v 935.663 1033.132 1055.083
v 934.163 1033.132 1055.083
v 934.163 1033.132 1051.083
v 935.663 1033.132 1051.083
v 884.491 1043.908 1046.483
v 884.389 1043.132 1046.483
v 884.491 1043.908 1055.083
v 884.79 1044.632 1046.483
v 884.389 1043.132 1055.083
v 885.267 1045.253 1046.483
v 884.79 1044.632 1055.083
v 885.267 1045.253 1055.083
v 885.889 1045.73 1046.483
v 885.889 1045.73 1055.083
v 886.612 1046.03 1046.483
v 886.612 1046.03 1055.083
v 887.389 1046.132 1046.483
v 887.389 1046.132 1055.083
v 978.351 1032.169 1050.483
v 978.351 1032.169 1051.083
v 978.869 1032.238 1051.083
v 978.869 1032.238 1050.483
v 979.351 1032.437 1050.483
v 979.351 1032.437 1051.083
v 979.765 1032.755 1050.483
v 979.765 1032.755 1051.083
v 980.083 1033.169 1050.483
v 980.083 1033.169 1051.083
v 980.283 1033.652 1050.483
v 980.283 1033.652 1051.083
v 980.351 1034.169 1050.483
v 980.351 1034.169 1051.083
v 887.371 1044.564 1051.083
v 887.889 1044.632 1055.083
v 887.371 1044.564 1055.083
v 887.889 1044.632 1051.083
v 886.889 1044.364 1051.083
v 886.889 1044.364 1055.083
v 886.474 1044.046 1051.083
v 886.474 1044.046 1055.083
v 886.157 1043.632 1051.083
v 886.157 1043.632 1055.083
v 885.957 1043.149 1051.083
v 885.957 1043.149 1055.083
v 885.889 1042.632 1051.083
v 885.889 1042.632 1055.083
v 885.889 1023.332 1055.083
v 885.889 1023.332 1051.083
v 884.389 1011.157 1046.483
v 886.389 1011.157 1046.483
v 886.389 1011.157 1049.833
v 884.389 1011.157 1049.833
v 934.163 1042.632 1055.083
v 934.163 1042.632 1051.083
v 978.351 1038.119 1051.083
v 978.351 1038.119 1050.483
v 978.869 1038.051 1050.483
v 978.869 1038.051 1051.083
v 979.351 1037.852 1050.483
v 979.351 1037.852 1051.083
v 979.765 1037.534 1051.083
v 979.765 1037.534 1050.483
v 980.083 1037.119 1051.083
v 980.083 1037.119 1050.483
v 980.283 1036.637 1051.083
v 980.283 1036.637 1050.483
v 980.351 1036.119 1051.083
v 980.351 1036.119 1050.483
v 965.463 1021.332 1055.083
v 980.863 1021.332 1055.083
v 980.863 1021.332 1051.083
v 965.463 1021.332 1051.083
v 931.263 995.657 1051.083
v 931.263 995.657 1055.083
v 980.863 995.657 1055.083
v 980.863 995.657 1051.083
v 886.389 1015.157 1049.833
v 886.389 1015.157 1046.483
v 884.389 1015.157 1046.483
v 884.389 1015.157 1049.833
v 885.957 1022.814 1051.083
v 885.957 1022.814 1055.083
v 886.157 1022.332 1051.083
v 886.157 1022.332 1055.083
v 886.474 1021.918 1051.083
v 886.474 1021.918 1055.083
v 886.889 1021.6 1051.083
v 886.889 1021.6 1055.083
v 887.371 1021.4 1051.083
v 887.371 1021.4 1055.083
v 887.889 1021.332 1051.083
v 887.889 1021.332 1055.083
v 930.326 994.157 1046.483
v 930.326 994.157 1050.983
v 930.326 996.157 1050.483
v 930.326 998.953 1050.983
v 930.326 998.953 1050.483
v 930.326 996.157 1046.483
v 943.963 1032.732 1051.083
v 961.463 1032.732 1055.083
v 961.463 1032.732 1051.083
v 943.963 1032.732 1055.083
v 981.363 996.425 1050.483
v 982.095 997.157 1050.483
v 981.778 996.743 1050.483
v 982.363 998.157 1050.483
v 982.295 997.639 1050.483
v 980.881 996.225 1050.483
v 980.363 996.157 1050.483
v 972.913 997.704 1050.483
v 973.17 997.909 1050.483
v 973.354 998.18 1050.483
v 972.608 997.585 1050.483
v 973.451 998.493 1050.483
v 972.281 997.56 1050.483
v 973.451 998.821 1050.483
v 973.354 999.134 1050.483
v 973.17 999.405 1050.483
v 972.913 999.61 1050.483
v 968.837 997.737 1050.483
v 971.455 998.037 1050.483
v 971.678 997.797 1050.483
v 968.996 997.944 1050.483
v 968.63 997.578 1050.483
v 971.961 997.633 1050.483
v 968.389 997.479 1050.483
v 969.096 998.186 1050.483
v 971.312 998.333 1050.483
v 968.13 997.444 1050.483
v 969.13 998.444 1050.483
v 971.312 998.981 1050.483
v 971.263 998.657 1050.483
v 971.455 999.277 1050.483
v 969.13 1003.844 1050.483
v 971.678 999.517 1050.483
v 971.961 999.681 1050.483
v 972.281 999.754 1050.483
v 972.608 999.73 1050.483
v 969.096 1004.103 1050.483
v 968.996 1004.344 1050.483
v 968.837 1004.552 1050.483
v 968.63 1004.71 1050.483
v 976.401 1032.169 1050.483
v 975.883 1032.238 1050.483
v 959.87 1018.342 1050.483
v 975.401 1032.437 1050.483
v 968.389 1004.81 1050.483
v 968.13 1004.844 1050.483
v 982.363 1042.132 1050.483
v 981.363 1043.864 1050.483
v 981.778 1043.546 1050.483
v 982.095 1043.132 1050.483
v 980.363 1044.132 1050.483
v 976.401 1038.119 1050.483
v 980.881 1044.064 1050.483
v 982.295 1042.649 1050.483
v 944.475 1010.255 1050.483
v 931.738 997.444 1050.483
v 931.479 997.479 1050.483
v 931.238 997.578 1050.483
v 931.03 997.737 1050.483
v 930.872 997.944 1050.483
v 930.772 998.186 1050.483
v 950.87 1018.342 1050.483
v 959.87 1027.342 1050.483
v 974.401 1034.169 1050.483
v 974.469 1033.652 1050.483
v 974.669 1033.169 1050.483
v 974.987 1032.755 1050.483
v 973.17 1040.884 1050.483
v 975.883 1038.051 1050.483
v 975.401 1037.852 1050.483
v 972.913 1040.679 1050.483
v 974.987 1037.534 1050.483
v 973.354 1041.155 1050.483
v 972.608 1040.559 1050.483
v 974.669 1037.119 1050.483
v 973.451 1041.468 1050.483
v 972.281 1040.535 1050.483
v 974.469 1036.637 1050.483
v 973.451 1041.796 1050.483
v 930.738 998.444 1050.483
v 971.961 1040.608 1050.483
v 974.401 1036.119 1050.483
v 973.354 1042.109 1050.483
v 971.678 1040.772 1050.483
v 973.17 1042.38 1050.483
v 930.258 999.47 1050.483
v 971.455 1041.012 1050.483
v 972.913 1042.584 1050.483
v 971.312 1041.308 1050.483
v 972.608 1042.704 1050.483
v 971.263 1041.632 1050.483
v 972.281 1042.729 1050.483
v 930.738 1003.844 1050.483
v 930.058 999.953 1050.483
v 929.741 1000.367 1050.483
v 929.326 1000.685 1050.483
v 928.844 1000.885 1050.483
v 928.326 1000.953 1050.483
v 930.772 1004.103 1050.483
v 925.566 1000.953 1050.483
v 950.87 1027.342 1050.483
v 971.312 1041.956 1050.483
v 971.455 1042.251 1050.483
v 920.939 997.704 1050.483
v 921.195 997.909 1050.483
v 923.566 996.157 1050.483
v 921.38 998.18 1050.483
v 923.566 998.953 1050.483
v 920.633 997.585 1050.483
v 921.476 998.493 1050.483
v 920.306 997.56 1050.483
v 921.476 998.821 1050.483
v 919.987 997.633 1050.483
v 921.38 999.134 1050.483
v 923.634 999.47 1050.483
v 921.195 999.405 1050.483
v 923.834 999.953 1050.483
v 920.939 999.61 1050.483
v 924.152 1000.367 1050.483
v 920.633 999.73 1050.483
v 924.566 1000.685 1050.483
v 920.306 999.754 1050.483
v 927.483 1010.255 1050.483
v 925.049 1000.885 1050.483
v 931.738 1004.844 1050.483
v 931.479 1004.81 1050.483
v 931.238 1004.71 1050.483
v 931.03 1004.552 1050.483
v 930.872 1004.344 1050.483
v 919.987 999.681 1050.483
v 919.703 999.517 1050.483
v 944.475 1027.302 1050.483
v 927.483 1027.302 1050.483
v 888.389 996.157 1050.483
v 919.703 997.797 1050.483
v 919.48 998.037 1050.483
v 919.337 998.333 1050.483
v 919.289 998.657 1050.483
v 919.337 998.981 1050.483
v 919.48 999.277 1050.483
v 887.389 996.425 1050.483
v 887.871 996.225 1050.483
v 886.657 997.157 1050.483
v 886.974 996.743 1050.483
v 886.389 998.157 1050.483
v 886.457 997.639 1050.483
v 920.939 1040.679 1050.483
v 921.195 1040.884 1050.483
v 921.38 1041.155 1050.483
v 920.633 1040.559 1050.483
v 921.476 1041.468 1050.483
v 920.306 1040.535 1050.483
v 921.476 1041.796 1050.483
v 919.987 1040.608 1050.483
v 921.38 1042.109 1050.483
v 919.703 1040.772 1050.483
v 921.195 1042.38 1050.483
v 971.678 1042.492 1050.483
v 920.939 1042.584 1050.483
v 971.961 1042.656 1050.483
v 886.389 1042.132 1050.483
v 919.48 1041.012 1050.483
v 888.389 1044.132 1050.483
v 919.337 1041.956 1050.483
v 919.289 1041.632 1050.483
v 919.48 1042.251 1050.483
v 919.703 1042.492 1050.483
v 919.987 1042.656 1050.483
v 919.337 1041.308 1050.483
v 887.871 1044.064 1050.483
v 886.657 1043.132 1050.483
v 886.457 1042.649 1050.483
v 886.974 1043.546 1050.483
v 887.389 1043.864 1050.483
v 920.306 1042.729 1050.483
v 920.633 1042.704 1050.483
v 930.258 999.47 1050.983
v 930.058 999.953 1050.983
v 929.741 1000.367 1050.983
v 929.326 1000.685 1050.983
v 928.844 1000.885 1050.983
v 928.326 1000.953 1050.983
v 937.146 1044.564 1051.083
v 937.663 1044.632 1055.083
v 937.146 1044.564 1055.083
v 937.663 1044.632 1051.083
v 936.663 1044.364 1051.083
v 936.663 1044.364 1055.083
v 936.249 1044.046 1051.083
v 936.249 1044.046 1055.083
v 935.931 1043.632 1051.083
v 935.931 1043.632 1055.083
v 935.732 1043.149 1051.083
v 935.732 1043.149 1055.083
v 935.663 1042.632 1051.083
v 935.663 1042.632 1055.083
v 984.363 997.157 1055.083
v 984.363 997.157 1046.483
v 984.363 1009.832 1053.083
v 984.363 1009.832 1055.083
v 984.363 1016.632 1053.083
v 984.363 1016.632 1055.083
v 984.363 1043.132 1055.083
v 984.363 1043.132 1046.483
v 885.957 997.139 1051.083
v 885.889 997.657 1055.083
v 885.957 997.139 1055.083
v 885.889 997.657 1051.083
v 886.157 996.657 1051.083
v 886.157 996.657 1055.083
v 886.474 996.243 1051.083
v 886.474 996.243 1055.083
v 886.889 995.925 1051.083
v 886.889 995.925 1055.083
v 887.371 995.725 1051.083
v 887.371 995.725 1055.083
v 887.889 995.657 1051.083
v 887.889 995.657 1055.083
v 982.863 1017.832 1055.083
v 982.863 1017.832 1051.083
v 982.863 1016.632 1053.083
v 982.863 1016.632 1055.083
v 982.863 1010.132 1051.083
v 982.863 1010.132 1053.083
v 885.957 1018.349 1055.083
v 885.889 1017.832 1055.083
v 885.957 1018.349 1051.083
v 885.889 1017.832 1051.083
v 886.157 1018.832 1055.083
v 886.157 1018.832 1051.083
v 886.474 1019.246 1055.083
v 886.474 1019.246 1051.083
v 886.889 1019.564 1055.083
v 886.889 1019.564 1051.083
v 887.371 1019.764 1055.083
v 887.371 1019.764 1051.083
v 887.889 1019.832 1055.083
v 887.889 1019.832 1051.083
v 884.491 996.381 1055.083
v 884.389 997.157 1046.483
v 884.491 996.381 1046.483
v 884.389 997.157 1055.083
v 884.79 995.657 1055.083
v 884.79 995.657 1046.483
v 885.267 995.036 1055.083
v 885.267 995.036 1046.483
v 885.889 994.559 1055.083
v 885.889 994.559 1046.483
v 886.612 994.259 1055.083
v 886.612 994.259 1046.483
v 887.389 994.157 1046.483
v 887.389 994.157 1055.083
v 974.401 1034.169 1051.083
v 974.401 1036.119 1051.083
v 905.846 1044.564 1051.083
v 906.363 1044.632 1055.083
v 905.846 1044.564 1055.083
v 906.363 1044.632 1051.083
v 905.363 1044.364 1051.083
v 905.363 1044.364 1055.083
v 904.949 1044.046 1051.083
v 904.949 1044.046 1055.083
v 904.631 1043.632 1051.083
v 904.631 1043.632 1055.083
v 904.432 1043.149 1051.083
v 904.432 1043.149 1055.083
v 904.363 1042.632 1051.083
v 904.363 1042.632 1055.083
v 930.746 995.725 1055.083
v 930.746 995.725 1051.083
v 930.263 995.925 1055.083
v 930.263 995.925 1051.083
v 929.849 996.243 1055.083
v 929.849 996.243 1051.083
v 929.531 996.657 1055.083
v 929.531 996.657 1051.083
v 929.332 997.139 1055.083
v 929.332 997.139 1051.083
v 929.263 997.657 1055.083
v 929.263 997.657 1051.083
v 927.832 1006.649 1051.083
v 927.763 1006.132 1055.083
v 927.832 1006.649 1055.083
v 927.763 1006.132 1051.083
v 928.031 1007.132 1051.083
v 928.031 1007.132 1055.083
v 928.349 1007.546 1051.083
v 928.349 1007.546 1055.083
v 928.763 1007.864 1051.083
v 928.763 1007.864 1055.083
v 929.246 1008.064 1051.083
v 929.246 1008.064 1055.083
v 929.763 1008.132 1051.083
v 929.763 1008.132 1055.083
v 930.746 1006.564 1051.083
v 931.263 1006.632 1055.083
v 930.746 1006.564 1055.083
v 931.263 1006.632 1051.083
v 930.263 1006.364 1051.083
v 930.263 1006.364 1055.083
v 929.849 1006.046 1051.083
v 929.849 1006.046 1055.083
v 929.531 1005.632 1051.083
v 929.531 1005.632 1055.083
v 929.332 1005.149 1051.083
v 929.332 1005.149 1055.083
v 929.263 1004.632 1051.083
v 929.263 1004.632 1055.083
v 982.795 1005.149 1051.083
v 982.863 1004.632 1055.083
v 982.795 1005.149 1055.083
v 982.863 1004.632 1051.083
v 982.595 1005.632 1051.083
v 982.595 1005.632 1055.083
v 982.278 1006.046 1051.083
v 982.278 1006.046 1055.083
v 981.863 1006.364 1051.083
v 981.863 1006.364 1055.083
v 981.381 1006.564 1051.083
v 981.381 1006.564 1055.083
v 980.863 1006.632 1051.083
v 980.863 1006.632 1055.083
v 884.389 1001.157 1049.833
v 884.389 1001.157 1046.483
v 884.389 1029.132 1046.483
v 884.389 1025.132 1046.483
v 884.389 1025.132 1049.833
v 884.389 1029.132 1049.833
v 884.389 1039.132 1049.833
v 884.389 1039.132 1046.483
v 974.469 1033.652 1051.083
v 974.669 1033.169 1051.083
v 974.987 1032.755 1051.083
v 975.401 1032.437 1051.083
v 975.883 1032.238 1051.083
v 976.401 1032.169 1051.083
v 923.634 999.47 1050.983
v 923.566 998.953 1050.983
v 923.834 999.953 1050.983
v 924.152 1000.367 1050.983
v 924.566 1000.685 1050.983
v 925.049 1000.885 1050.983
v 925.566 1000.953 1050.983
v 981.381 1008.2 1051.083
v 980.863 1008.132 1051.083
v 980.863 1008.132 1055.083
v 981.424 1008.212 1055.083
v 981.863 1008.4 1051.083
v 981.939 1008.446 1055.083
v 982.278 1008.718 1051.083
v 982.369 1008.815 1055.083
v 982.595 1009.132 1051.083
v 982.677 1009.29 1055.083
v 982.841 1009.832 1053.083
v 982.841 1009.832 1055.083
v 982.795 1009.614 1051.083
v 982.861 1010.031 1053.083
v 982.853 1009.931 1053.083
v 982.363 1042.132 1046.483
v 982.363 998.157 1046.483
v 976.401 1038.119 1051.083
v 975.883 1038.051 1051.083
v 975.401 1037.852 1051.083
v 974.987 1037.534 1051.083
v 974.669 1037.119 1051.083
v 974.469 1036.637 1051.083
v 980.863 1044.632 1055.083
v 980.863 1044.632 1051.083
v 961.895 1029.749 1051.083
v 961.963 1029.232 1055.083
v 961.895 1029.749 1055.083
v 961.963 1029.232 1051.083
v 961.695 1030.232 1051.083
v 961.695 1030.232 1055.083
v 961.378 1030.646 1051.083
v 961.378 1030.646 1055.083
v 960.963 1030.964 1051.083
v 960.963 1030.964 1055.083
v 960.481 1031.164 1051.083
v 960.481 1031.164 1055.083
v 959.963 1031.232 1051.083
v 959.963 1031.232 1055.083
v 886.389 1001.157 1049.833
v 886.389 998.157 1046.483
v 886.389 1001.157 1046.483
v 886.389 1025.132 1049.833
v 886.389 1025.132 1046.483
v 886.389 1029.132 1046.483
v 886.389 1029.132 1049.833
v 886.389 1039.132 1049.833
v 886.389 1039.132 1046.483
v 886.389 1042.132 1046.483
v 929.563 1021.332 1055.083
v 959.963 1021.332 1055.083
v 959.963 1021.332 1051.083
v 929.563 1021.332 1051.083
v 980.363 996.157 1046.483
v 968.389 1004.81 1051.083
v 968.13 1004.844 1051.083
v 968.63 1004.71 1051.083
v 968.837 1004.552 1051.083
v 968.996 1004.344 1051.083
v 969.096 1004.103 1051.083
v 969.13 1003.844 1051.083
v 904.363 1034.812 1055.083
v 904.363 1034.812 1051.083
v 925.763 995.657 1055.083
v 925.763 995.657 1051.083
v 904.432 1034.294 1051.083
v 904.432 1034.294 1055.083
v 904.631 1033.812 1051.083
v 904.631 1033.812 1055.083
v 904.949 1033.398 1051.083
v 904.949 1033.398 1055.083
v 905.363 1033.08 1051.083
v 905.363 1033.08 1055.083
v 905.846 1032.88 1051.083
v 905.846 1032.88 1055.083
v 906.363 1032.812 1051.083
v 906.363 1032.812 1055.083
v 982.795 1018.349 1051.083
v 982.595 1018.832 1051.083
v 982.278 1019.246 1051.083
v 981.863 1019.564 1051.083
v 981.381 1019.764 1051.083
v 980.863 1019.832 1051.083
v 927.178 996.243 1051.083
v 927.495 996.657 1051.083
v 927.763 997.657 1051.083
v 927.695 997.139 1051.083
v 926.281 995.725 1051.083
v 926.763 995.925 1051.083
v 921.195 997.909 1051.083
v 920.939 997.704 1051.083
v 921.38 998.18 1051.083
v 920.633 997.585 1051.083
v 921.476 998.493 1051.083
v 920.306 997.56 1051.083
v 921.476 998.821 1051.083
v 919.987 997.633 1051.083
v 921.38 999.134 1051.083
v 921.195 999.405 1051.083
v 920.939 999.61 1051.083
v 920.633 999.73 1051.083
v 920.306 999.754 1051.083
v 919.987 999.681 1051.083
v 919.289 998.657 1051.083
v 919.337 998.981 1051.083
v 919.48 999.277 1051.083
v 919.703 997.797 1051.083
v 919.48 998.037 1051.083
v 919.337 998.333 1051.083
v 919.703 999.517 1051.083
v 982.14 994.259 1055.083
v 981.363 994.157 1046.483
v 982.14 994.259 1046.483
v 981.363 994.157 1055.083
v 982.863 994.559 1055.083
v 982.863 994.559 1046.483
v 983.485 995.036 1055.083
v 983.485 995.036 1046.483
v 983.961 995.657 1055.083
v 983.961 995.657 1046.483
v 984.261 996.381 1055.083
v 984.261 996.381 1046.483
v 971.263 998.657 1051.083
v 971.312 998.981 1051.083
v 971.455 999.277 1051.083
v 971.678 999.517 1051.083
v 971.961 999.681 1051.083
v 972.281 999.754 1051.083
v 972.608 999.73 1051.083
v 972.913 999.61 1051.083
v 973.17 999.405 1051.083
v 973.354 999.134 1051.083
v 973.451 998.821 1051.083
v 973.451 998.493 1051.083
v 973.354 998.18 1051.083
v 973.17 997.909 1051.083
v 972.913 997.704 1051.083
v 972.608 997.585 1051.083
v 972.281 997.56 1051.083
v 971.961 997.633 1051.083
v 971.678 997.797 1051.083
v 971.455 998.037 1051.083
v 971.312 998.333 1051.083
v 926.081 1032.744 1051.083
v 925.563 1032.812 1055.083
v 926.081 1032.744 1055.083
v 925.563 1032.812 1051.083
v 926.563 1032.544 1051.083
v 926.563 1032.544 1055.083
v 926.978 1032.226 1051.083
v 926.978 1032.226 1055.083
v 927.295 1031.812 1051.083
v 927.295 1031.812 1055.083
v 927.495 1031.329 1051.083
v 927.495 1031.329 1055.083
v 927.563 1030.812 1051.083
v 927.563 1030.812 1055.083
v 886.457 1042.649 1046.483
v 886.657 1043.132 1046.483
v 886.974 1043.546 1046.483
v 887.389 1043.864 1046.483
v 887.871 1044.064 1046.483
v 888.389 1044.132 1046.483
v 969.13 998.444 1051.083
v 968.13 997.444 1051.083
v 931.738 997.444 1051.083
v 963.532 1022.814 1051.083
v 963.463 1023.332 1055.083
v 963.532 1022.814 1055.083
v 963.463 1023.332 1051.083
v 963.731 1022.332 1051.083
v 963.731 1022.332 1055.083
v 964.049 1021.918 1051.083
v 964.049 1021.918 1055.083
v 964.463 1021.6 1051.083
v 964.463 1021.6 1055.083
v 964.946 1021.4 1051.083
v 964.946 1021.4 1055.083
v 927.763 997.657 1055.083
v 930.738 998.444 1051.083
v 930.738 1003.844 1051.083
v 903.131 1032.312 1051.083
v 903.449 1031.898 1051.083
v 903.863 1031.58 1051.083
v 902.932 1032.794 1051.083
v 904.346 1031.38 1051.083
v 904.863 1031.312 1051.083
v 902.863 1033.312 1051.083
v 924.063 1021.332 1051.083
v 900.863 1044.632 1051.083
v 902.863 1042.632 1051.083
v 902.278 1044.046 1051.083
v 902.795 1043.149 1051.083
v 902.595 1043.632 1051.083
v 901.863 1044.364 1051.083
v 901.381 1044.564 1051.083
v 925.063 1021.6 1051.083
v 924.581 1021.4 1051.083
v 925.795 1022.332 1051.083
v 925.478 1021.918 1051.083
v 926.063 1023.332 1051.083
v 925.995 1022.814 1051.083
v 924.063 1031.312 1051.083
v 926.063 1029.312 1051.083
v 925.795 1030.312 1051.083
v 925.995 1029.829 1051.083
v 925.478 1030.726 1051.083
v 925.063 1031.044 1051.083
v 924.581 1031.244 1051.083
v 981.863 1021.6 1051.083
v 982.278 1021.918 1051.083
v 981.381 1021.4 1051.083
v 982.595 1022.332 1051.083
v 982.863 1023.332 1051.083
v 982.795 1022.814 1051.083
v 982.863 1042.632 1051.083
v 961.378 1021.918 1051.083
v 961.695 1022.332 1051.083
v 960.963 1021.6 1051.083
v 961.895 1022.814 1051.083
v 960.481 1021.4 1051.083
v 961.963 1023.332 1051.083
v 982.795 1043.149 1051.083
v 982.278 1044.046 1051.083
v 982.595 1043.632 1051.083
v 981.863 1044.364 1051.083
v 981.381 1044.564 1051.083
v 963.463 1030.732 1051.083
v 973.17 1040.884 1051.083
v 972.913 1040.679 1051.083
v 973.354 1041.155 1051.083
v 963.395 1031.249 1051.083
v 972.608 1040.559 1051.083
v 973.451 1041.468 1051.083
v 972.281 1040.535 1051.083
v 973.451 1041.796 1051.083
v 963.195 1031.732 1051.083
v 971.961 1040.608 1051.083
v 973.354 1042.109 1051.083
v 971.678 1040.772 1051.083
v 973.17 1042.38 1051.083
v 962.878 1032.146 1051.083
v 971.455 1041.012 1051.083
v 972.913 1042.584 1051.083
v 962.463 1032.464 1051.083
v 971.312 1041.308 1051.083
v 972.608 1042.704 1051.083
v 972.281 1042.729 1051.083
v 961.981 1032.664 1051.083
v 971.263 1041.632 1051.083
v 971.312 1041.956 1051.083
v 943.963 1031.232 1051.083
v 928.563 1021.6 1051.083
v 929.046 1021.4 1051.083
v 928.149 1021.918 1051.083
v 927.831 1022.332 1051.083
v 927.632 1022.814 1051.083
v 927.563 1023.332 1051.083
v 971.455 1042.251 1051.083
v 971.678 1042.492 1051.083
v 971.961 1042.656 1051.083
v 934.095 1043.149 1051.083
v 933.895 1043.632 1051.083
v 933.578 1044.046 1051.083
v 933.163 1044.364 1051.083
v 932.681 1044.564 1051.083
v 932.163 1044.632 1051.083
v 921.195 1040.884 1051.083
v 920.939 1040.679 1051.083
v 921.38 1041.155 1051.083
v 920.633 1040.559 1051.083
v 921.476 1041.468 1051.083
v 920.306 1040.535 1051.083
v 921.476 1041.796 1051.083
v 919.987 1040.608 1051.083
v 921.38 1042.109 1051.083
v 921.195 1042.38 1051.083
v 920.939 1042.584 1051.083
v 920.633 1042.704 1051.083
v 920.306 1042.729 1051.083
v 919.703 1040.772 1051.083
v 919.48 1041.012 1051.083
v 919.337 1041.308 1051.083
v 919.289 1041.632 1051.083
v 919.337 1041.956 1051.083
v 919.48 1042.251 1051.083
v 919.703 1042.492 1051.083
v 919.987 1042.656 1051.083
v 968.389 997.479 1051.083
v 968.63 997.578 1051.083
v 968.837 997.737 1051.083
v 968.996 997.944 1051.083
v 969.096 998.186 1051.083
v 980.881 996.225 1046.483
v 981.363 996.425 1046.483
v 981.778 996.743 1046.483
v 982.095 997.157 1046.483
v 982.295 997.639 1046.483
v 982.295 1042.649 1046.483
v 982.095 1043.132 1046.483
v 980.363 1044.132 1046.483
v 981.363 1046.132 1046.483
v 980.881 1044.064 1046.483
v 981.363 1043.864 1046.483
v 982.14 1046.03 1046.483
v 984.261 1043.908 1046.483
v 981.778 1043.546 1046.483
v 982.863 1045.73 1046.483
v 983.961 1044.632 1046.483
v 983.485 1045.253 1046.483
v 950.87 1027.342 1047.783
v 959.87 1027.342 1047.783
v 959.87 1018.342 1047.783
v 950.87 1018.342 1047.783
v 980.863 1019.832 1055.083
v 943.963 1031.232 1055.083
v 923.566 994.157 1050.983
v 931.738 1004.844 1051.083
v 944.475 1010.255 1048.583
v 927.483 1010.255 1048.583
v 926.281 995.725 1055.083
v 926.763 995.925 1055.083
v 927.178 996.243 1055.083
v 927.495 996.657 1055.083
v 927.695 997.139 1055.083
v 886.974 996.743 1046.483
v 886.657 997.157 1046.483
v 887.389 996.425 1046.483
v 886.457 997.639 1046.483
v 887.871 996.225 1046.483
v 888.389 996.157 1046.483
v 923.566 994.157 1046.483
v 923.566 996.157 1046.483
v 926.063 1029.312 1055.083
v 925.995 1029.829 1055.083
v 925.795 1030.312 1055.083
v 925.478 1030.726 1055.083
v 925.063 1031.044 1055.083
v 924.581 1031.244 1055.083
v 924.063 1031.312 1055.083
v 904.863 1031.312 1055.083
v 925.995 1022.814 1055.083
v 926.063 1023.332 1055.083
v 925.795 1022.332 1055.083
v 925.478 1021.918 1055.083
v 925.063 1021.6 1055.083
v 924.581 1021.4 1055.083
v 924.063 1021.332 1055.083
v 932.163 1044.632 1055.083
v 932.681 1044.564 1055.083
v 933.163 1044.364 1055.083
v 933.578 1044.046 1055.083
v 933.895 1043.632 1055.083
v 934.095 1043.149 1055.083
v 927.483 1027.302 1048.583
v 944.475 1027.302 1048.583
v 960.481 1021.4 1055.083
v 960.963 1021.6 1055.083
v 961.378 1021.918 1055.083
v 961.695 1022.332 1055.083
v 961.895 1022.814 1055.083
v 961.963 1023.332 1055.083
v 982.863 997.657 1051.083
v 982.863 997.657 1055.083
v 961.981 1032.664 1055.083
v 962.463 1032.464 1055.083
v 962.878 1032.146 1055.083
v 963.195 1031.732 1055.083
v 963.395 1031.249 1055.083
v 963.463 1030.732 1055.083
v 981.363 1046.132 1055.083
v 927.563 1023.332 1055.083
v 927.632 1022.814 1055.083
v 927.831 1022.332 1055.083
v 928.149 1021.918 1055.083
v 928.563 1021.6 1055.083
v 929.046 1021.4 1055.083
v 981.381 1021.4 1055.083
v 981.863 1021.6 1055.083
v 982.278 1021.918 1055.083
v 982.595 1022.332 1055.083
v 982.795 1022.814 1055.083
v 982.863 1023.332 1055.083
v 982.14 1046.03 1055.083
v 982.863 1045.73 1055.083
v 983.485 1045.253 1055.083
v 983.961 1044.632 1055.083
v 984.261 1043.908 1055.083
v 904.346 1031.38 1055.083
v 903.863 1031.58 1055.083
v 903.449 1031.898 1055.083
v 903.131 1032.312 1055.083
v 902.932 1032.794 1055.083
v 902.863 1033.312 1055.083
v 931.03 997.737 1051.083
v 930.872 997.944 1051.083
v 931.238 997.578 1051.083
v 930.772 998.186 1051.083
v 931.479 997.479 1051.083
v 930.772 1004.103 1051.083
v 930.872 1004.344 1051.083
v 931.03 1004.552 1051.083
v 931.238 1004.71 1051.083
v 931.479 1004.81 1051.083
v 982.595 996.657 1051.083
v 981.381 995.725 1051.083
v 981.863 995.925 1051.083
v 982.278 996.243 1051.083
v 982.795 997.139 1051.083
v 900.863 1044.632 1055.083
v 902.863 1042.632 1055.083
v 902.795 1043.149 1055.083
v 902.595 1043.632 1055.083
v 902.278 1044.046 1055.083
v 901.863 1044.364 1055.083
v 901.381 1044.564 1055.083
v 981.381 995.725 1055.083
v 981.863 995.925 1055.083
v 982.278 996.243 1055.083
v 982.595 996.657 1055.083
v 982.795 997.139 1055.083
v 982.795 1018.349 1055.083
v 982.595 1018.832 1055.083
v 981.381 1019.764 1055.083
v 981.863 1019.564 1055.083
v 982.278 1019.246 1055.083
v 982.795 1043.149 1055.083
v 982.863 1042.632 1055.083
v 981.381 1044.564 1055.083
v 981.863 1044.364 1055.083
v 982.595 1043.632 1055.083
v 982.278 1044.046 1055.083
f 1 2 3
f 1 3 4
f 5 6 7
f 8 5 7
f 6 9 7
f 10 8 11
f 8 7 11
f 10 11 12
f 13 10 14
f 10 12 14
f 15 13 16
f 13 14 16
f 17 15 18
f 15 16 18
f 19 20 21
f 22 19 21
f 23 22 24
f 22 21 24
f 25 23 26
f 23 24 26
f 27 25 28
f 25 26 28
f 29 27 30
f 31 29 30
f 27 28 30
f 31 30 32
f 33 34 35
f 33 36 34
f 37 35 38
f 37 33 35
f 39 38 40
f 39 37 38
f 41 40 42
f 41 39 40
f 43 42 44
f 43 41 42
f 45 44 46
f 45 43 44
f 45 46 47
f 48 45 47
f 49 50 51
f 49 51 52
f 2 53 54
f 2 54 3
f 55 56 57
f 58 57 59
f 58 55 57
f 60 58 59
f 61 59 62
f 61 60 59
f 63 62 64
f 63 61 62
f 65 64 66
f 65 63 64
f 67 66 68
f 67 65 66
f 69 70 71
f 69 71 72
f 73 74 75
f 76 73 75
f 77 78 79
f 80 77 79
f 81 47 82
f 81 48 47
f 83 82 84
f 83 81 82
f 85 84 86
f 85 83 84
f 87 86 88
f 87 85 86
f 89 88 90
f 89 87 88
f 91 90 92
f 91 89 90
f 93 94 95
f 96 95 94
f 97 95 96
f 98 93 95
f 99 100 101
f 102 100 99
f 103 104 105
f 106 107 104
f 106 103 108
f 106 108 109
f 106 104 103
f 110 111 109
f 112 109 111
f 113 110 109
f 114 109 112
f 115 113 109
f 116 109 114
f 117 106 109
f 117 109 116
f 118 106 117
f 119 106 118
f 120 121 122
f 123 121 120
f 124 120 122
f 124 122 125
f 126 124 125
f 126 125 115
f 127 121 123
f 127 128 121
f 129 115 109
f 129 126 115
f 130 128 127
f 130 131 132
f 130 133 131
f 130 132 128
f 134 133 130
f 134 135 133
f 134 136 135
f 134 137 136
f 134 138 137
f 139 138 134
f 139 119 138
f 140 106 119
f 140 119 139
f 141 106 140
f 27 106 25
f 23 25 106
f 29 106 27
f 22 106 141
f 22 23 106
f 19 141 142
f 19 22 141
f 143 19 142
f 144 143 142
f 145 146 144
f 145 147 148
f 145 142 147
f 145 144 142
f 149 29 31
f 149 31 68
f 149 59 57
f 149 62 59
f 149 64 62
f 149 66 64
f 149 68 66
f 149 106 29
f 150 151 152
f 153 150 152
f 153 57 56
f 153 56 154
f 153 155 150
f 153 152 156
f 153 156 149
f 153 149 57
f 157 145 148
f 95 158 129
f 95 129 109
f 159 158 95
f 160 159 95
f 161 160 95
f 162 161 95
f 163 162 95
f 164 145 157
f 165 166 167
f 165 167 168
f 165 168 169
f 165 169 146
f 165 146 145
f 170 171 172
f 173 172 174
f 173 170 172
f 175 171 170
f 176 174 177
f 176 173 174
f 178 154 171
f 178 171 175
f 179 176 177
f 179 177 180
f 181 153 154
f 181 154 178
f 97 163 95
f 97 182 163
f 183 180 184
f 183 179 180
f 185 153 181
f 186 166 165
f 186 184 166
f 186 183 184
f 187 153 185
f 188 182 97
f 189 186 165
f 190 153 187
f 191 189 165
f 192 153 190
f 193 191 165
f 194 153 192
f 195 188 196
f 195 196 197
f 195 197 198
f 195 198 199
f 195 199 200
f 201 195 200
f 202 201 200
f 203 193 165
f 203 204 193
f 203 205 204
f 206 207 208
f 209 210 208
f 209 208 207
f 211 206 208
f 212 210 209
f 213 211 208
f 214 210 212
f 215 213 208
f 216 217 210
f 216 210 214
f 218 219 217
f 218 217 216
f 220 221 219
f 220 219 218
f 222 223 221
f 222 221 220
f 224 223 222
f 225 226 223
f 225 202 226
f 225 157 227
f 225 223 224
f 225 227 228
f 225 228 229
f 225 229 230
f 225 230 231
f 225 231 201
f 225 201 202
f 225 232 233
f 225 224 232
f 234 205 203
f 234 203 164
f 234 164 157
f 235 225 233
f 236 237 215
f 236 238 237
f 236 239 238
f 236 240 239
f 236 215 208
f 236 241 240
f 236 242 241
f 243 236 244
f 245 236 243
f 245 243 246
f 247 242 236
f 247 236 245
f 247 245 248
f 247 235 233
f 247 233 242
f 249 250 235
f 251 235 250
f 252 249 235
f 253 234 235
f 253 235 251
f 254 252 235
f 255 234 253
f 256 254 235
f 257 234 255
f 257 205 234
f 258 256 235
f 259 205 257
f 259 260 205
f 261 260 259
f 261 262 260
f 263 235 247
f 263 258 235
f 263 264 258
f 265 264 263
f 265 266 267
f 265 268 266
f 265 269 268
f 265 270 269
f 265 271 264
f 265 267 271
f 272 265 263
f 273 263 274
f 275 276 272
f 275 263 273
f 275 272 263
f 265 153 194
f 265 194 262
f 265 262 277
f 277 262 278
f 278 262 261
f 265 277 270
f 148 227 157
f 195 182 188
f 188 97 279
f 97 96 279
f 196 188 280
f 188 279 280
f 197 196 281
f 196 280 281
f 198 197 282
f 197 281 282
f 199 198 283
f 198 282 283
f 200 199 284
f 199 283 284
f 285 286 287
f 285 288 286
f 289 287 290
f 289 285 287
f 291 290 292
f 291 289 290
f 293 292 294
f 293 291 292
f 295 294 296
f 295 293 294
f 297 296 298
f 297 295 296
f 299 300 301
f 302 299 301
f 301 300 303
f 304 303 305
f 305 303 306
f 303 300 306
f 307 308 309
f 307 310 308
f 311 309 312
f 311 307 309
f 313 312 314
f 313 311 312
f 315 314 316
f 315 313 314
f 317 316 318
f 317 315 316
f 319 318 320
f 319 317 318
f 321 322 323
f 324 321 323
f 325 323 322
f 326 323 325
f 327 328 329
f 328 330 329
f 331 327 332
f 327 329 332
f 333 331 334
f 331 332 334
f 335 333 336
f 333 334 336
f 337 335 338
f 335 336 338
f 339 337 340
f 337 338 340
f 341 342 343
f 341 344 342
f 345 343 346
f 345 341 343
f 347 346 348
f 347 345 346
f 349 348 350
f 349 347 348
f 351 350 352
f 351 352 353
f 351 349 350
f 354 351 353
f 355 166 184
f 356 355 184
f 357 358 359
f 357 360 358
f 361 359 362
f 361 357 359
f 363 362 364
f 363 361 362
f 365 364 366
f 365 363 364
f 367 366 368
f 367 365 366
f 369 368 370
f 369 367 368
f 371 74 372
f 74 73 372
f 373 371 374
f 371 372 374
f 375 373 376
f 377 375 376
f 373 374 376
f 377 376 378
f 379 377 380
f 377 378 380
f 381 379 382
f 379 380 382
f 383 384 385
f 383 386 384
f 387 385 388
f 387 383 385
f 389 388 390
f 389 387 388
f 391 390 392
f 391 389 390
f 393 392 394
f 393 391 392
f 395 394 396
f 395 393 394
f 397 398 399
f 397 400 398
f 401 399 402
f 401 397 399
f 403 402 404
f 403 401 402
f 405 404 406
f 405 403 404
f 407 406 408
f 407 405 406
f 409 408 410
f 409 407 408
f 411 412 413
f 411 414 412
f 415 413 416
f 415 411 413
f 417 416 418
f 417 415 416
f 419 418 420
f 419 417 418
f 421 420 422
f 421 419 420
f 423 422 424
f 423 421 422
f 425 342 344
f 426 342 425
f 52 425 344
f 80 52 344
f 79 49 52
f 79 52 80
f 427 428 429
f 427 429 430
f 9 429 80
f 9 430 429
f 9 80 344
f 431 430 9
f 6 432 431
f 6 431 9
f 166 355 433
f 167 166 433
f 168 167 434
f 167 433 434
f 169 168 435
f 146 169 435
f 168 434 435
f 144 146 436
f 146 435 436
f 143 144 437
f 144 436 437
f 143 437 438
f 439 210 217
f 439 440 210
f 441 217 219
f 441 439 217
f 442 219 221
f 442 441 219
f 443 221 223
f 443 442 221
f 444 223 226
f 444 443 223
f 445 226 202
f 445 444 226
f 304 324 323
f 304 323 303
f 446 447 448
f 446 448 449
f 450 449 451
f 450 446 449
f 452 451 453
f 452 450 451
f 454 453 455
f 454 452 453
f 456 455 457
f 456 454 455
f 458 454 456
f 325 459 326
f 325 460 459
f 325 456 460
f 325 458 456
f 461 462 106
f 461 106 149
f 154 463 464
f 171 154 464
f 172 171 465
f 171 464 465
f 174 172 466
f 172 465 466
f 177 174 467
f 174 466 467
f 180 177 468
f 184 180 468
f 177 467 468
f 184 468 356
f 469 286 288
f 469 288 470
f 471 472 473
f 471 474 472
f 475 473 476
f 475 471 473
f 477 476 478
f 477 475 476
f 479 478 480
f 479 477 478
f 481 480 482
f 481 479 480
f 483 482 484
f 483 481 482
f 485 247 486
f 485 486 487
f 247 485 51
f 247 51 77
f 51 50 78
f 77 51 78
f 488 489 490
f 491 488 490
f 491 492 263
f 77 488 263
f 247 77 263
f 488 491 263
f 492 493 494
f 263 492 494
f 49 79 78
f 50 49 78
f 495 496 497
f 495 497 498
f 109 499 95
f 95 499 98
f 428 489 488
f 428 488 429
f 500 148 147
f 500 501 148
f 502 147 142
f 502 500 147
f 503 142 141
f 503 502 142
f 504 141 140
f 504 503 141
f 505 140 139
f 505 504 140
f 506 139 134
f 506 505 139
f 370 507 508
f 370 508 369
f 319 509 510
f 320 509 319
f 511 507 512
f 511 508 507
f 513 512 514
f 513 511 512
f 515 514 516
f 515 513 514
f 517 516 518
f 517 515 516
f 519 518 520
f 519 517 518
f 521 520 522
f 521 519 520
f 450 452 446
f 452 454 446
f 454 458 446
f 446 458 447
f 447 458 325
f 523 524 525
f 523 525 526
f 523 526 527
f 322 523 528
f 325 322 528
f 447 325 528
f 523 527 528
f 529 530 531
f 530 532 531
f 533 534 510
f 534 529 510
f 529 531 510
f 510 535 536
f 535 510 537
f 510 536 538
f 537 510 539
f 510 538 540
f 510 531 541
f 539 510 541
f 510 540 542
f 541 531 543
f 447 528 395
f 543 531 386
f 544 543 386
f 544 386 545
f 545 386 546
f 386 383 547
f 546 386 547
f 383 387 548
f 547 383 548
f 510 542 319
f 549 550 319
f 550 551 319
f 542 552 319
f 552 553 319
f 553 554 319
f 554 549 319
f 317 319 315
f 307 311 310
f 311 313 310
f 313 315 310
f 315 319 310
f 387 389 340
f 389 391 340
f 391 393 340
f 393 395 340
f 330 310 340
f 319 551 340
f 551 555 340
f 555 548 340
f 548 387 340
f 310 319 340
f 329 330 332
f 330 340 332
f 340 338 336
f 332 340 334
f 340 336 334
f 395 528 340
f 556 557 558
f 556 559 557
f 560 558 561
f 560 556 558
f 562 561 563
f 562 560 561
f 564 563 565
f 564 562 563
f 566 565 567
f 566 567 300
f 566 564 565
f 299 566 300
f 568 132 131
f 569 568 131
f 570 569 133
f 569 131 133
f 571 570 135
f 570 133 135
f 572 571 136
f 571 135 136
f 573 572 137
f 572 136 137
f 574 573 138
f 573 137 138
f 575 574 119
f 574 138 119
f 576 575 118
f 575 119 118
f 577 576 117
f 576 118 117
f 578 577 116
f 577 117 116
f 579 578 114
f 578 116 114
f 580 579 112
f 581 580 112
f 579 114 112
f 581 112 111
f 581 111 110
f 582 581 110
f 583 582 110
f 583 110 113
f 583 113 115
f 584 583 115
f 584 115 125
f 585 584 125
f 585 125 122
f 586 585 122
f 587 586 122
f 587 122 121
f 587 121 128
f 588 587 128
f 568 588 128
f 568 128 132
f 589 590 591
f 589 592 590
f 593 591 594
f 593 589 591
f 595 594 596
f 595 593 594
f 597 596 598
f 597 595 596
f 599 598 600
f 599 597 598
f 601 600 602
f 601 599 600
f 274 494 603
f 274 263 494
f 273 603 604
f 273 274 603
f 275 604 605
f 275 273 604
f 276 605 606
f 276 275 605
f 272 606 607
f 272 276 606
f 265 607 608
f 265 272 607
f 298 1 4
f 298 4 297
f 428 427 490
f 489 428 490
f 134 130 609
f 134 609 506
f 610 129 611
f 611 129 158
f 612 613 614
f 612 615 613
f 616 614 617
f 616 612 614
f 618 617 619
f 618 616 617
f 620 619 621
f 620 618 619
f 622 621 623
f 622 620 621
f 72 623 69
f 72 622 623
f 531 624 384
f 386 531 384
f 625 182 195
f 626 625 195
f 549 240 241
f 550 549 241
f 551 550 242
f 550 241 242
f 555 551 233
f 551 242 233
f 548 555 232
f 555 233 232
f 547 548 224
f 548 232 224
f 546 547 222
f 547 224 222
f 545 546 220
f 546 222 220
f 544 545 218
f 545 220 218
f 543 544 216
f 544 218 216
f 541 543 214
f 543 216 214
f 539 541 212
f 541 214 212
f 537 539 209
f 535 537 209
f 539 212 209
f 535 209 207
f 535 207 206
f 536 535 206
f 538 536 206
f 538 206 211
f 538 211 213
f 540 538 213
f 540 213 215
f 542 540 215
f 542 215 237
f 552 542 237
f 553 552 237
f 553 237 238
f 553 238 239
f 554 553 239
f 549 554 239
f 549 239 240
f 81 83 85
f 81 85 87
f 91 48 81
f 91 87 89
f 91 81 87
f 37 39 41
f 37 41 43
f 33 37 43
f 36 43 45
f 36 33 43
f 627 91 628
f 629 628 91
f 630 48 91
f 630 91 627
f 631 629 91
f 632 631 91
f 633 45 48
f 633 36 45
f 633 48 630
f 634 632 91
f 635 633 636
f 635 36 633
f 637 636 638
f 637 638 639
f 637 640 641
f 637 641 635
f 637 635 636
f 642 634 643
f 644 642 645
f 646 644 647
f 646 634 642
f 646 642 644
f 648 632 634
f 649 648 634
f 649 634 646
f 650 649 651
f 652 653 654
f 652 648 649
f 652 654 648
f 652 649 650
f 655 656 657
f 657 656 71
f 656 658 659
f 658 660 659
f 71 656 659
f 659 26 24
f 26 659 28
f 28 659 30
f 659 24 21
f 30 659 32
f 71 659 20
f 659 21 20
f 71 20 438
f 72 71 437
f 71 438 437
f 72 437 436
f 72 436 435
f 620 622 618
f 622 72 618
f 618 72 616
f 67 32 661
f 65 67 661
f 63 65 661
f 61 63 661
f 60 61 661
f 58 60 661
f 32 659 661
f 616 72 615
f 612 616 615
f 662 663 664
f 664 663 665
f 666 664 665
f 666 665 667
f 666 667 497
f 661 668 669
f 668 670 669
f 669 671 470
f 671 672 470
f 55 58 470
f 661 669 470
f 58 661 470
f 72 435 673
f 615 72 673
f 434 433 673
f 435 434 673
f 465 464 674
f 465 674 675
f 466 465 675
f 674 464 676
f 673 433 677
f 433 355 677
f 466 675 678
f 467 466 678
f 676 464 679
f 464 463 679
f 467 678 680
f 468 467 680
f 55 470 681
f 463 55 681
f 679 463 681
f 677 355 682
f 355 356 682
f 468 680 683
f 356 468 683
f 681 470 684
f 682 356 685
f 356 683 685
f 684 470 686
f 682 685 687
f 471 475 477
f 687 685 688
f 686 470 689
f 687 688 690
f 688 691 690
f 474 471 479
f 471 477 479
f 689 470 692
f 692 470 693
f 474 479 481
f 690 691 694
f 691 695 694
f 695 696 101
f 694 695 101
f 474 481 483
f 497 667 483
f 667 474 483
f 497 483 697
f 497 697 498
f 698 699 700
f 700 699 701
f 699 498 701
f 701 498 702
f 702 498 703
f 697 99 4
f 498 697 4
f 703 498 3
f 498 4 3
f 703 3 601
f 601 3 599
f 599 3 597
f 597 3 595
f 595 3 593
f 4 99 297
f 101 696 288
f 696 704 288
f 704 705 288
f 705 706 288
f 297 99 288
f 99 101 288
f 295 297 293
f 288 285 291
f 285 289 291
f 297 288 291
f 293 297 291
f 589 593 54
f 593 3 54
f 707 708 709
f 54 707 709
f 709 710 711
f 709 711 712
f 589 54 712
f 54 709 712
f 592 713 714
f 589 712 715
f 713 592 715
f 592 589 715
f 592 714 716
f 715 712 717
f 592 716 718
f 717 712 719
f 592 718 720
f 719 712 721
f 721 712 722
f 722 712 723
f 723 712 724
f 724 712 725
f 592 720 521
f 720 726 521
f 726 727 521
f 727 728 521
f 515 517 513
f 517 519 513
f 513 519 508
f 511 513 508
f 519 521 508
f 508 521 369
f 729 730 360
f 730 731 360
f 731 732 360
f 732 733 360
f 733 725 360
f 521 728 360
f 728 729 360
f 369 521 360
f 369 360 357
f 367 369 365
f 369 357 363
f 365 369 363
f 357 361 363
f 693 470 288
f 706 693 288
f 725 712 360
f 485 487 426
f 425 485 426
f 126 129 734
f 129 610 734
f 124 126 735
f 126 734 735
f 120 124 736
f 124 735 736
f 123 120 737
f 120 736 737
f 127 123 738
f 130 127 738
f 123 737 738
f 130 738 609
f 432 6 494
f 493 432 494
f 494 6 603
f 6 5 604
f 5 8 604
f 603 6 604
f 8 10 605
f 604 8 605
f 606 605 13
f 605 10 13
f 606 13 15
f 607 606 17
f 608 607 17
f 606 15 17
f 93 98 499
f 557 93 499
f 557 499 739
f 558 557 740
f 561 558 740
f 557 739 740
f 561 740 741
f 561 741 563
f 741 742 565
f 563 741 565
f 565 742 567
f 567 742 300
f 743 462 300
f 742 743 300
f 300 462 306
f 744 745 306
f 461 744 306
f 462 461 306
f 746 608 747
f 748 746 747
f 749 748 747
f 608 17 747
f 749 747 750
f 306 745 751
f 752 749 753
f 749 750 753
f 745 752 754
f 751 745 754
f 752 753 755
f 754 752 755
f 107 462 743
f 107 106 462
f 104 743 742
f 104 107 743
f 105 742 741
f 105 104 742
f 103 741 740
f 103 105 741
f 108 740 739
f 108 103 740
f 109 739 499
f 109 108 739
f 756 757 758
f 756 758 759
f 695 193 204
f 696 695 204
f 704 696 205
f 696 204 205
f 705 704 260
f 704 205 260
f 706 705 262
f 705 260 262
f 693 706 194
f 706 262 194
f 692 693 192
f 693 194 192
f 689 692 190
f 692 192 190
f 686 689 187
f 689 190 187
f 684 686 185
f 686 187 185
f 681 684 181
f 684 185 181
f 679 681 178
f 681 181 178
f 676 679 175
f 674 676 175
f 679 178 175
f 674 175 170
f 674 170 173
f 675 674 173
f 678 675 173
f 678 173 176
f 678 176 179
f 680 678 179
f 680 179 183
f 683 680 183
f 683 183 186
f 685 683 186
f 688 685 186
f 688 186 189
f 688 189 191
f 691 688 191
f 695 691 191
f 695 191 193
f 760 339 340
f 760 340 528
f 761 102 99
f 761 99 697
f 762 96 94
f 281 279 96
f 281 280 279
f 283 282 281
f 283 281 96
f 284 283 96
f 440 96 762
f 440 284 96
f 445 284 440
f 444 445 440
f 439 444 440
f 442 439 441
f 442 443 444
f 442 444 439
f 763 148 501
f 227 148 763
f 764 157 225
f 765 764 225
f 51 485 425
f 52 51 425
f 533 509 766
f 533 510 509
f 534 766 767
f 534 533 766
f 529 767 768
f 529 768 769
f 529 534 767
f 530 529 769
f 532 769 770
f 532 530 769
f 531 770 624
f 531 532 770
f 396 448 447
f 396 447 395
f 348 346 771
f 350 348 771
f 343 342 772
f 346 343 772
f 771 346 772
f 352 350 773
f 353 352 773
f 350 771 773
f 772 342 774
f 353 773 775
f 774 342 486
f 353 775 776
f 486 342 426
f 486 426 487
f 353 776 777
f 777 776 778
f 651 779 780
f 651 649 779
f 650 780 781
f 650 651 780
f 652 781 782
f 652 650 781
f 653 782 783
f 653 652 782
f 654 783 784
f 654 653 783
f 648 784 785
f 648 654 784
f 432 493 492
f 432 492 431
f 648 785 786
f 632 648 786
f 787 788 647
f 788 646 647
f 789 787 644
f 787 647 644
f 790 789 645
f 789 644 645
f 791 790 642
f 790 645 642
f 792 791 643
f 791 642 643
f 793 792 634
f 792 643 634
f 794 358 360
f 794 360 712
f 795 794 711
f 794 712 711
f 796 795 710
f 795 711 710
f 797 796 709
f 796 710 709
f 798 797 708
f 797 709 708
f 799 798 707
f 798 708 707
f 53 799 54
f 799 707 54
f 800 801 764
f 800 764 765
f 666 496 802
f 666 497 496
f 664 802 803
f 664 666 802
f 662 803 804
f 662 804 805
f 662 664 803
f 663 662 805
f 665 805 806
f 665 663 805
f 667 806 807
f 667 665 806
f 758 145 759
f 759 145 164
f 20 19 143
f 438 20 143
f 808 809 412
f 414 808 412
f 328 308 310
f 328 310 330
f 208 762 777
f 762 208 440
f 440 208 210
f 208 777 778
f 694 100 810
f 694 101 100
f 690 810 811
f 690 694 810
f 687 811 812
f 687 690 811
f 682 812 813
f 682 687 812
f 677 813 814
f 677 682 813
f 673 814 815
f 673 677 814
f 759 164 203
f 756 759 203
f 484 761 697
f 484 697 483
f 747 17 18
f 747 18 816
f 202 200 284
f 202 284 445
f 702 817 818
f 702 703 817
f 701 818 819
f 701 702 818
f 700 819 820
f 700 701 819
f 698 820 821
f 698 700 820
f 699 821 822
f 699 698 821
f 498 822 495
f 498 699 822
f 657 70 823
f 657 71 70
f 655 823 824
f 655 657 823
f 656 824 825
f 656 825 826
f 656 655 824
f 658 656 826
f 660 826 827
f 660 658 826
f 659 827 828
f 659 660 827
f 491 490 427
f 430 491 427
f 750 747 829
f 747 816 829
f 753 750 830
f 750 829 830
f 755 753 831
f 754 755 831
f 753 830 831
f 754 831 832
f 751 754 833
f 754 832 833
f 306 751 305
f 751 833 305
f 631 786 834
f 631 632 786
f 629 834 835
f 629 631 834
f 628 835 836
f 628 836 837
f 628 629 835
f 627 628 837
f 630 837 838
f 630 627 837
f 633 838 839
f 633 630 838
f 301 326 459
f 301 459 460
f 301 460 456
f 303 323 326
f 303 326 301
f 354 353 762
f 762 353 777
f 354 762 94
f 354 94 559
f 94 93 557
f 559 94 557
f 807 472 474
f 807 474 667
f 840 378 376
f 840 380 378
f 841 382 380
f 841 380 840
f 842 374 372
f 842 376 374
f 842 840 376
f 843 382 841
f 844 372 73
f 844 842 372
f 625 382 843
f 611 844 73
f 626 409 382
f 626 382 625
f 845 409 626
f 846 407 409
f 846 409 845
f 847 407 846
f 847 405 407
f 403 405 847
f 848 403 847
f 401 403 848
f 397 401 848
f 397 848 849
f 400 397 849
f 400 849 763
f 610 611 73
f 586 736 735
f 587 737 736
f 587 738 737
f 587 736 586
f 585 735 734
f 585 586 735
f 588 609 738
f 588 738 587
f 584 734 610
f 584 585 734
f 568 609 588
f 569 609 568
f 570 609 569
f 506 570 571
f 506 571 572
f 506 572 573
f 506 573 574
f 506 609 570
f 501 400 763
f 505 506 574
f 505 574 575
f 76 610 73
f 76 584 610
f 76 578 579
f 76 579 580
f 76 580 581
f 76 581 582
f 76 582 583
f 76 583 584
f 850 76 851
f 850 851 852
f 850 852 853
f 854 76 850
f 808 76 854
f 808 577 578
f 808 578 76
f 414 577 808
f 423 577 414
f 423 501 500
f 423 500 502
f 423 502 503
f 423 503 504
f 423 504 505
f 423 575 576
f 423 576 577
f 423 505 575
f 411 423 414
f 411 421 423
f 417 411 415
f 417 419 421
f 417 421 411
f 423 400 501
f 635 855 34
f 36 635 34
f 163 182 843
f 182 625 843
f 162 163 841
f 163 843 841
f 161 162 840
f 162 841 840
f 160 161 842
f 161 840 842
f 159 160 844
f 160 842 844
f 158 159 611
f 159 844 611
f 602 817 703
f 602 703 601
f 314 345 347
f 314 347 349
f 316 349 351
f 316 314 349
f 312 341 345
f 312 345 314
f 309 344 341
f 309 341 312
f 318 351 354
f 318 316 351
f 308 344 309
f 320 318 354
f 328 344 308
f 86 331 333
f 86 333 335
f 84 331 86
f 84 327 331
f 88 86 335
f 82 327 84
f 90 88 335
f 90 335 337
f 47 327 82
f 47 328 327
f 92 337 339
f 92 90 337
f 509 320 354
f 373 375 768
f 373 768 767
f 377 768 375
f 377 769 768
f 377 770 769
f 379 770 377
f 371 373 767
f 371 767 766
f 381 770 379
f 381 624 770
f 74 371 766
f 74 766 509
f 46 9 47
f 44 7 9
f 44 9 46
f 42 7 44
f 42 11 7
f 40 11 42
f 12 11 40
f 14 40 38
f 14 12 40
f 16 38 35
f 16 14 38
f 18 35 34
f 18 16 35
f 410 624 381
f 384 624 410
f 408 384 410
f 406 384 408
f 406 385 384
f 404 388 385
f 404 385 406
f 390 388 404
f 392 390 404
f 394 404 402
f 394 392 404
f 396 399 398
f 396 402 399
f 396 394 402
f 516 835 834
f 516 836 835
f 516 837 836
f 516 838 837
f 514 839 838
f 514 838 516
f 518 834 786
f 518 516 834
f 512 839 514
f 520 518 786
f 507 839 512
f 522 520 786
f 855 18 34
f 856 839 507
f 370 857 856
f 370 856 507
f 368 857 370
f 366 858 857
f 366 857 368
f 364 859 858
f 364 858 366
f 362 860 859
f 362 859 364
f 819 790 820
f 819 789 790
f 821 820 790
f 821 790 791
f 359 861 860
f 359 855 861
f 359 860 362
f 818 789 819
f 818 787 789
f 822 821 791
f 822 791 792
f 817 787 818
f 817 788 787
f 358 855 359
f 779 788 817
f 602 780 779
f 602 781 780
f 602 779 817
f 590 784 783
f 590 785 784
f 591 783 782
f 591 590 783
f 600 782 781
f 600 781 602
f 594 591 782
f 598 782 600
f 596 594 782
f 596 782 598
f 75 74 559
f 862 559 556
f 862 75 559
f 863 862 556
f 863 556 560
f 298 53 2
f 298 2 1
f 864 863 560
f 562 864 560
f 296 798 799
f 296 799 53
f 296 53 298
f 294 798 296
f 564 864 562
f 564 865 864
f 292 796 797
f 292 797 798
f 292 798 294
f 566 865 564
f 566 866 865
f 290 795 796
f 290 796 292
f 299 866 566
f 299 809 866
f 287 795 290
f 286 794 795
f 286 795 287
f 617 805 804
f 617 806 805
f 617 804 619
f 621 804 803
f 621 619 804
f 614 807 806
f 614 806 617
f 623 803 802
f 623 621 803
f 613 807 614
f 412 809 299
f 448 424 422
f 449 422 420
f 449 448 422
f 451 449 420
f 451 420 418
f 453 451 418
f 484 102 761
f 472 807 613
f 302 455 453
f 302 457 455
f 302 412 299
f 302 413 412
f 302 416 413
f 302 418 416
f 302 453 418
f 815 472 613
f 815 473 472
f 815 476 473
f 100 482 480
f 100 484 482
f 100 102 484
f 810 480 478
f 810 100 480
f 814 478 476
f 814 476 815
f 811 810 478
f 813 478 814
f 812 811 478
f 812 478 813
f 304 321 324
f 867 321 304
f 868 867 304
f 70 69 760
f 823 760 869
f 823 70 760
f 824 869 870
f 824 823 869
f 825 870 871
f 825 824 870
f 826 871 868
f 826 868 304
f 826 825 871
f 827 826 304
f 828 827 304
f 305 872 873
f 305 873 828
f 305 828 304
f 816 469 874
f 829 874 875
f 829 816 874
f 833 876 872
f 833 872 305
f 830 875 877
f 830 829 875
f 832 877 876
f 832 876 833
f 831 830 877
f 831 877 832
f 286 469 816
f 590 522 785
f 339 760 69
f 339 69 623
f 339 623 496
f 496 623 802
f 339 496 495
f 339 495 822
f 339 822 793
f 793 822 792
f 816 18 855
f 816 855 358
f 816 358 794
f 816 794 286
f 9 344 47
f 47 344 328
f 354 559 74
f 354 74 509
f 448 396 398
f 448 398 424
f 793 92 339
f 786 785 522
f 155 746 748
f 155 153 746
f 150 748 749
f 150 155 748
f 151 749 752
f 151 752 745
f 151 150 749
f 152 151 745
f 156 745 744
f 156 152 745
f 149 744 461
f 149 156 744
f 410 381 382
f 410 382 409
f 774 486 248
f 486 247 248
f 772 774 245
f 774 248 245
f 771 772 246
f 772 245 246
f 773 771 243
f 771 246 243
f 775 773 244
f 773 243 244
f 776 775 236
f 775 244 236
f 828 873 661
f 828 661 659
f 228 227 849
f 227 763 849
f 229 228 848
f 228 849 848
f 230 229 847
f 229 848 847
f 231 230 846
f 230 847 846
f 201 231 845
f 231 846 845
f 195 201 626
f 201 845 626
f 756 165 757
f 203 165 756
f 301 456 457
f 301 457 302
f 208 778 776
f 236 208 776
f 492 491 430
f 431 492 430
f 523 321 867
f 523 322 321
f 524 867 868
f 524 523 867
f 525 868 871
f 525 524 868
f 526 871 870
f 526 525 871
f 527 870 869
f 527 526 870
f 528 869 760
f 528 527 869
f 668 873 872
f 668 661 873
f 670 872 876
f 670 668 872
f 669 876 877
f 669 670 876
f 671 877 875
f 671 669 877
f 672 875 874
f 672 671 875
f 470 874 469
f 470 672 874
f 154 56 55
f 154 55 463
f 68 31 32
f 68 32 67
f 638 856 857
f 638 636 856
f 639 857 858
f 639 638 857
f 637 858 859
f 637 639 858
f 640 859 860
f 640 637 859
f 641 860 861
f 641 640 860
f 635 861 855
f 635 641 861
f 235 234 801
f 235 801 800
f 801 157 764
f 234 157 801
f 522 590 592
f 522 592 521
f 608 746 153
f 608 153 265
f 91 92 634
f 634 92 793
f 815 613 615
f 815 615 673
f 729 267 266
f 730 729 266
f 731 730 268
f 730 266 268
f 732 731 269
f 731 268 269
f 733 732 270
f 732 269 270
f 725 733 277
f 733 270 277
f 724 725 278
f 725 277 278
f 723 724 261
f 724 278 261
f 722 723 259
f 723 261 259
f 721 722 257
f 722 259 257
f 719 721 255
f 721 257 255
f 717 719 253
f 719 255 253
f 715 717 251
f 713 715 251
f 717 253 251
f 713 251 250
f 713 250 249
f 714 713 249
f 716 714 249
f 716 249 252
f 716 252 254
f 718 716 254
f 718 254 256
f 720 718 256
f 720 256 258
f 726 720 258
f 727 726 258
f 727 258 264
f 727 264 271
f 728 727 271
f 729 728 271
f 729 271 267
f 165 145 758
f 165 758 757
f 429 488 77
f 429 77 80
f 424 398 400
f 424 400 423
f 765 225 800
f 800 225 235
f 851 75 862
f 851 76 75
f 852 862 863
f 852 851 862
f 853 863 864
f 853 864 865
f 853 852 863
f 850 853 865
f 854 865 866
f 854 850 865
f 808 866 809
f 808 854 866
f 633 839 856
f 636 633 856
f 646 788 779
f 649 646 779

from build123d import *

# Parameters (mm, degrees)
SKETCH_1_W           = 99.974800609
SKETCH_1_H           = 51.97470409
EXTRUDE_1_DEPTH      = 8.6
SKETCH_2_W           = 95.974800609
SKETCH_2_H           = 47.97470409
CUT_EXTRUDE_1_DEPTH  = 4
SKETCH_3_W           = 2
SKETCH_3_H           = 10
SKETCH_3_H_2         = 9.97470409
CUT_EXTRUDE_2_DEPTH  = 3.35
SKETCH_4_R           = 1.1
SKETCH_4_W           = 38.392586289
SKETCH_4_H           = 7.4
SKETCH_4_W_2         = 5.95
SKETCH_4_H_2         = 5.95
CUT_EXTRUDE_3_DEPTH  = 1437.448457956
SKETCH_6_W           = 6.76
SKETCH_6_H           = 6.795709929
CUT_EXTRUDE_4_DEPTH  = 4.5
FILLET_1_R           = 3
FILLET_3_R           = 2
SKETCH_12_W          = 9.000025401
SKETCH_12_H          = 9.0000508
EXTRUDE_3_DEPTH      = 2.7
SKETCH_13_W          = 16.992125984
SKETCH_13_H          = 17.047314393
EXTRUDE_4_DEPTH      = 1.9
SKETCH_7_W           = 53.6
SKETCH_7_H           = 10.97470409
CUT_EXTRUDE_14_DEPTH = 4
FILLET_7_R           = 2
FILLET_8_R           = 1
SKETCH_14_W          = 2.323736835
SKETCH_14_H          = 6.8
CUT_EXTRUDE_15_DEPTH = 2


with BuildPart() as part:
    # 草图1 → 凸台-拉伸1 (new body)
    with BuildSketch(Plane.XY.offset(1046.483288979)):
        with Locations((934.375963031, 1020.144466268)):
            Rectangle(SKETCH_1_W, SKETCH_1_H)
    extrude(amount=EXTRUDE_1_DEPTH)

    # 草图2 → 切除-拉伸1 (cut)
    with BuildSketch(Plane(origin=(0, 0, 1046.483288979), x_dir=(-1, 0, 0), z_dir=(0, 0, -1))):
        with Locations((-934.375963031, 1020.144466268)):
            Rectangle(SKETCH_2_W, SKETCH_2_H)
    extrude(amount=-CUT_EXTRUDE_1_DEPTH, mode=Mode.SUBTRACT)

    # 草图3 → 切除-拉伸2 (cut)
    with BuildSketch(Plane(origin=(0, 0, 1046.483288979), x_dir=(-1, 0, 0), z_dir=(0, 0, -1))):
        with Locations((-885.388562726, 1034.131818313)):
            Rectangle(SKETCH_3_W, SKETCH_3_H)
        with Locations((-885.388562726, 1020.144466268)):
            Rectangle(SKETCH_3_W, SKETCH_3_H_2)
        with Locations((-885.388562726, 1006.157114223)):
            Rectangle(SKETCH_3_W, SKETCH_3_H)
    extrude(amount=-CUT_EXTRUDE_2_DEPTH, mode=Mode.SUBTRACT)

    # 草图4 → 切除-拉伸3 (cut, through all)
    with BuildSketch(Plane(origin=(0, 0, 1050.483288979), x_dir=(-1, 0, 0), z_dir=(0, 0, -1))):
        with Locations((-920.388562726, 1041.631818313)):
            Circle(SKETCH_4_R)
        with Locations((-920.388562726, 998.657114223)):
            Circle(SKETCH_4_R)
        with Locations((-972.363363335, 998.657114223)):
            Circle(SKETCH_4_R)
        with Locations((-972.363363335, 1041.631818313)):
            Circle(SKETCH_4_R)
        with Locations((-949.933821712, 1001.144429438)):
            Rectangle(SKETCH_4_W, SKETCH_4_H)
        with Locations((-977.376048121, 1035.144495478)):
            Rectangle(SKETCH_4_W_2, SKETCH_4_H_2)
    extrude(amount=-CUT_EXTRUDE_3_DEPTH, mode=Mode.SUBTRACT)

    # 草图6 → 切除-拉伸4 (cut)
    with BuildSketch(Plane(origin=(0, 0, 1046.483288979), x_dir=(-1, 0, 0), z_dir=(0, 0, -1))):
        with Locations((-926.946347841, 997.554969188)):
            Rectangle(SKETCH_6_W, SKETCH_6_H)
    extrude(amount=-CUT_EXTRUDE_4_DEPTH, mode=Mode.SUBTRACT)

    # 圆角1
    fillet_1_edges = [part.edges().sort_by_distance(p)[0] for p in [
        (884.388562726, 1046.131818313, 1050.783288979),
        (984.363363335, 1046.131818313, 1050.783288979),
        (984.363363335, 994.157114223, 1050.783288979),
        (884.388562726, 994.157114223, 1050.783288979),
    ]]
    fillet(fillet_1_edges, radius=FILLET_1_R)

    # 圆角3
    fillet_3_edges = [part.edges().sort_by_distance(p)[0] for p in [
        (980.351048121, 1032.169495478, 1052.783288979),
        (980.351048121, 1038.119495478, 1052.783288979),
        (974.401048121, 1038.119495478, 1052.783288979),
        (974.401048121, 1032.169495478, 1052.783288979),
    ]]
    fillet(fillet_3_edges, radius=FILLET_3_R)

    # 草图12 → 凸台-拉伸3 (add)
    with BuildSketch(Plane(origin=(0, 0, 1050.483288979), x_dir=(-1, 0, 0), z_dir=(0, 0, -1))):
        with Locations((-955.369926709, 1022.842410134)):
            Rectangle(SKETCH_12_W, SKETCH_12_H)
    extrude(amount=EXTRUDE_3_DEPTH)

    # 草图13 → 凸台-拉伸4 (add)
    with BuildSketch(Plane(origin=(0, 0, 1050.483288979), x_dir=(-1, 0, 0), z_dir=(0, 0, -1))):
        with Locations((-935.979052947, 1018.778239857)):
            Rectangle(SKETCH_13_W, SKETCH_13_H)
    extrude(amount=EXTRUDE_4_DEPTH)

    # 草图7 → 切除-拉伸14 (cut)
    with BuildSketch(Plane.XY.offset(1055.083288979)):
        Polygon((885.888562726, 1019.831818313), (982.863363335, 1019.831818313), (982.863363335, 1008.131818313), (927.763363335, 1008.131818313), (927.763363335, 1006.631818313), (927.763363335, 995.657114223), (885.888562726, 995.657114223), align=None)
        Polygon((934.163363335, 1044.631818313), (934.163363335, 1033.131818313), (935.663363335, 1033.131818313), (935.663363335, 1044.631818313), (982.863363335, 1044.631818313), (982.863363335, 1021.331818313), (963.463363335, 1021.331818313), (963.463363335, 1032.731818313), (943.963363335, 1032.731818313), (943.963363335, 1031.231818313), (961.963363335, 1031.231818313), (961.963363335, 1021.331818313), (927.563363335, 1021.331818313), (927.563363335, 1032.811818313), (904.363363335, 1032.811818313), (904.363363335, 1044.631818313), align=None)
        with Locations((956.063363335, 1001.144466268)):
            Rectangle(SKETCH_7_W, SKETCH_7_H)
        Polygon((926.063363335, 1021.331818313), (926.063363335, 1031.311818313), (902.863363335, 1031.311818313), (902.863363335, 1044.631818313), (885.888562726, 1044.631818313), (885.888562726, 1021.331818313), align=None)
    extrude(amount=-CUT_EXTRUDE_14_DEPTH, mode=Mode.SUBTRACT)

    # 圆角7
    fillet_7_edges = [part.edges().sort_by_distance(p)[0] for p in [
        (923.566347841, 1000.952824152, 1050.733288979),
        (930.326347841, 1000.952824152, 1050.733288979),
        (982.363363335, 996.157114223, 1048.483288979),
        (982.363363335, 1044.131818313, 1048.483288979),
        (886.388562726, 1044.131818313, 1048.483288979),
        (886.388562726, 996.157114223, 1048.483288979),
        (982.863363335, 995.657114223, 1053.083288979),
        (929.263363335, 995.657114223, 1053.083288979),
        (929.263363335, 1006.631818313, 1053.083288979),
        (982.863363335, 1006.631818313, 1053.083288979),
        (961.963363335, 1021.331818313, 1053.083288979),
        (927.563363335, 1021.331818313, 1053.083288979),
        (927.563363335, 1032.811818313, 1053.083288979),
        (904.363363335, 1032.811818313, 1053.083288979),
        (904.363363335, 1044.631818313, 1053.083288979),
        (934.163363335, 1044.631818313, 1053.083288979),
        (935.663363335, 1044.631818313, 1053.083288979),
        (982.863363335, 1044.631818313, 1053.083288979),
        (982.863363335, 1021.331818313, 1053.083288979),
        (963.463363335, 1021.331818313, 1053.083288979),
        (963.463363335, 1032.731818313, 1053.083288979),
        (961.963363335, 1031.231818313, 1053.083288979),
        (885.888562726, 1021.331818313, 1053.083288979),
        (885.888562726, 1044.631818313, 1053.083288979),
        (902.863363335, 1044.631818313, 1053.083288979),
        (902.863363335, 1031.311818313, 1053.083288979),
        (926.063363335, 1031.311818313, 1053.083288979),
        (926.063363335, 1021.331818313, 1053.083288979),
        (927.763363335, 995.657114223, 1053.083288979),
        (885.888562726, 995.657114223, 1053.083288979),
        (885.888562726, 1019.831818313, 1053.083288979),
        (982.863363335, 1019.831818313, 1053.083288979),
        (982.863363335, 1008.131818313, 1053.083288979),
        (927.763363335, 1008.131818313, 1053.083288979),
    ]]
    fillet(fillet_7_edges, radius=FILLET_7_R)

    # 圆角8
    fillet_8_edges = [part.edges().sort_by_distance(p)[0] for p in [
        (930.737528567, 997.444429438, 1050.783288979),
        (969.130114856, 997.444429438, 1050.783288979),
        (930.737528567, 1004.844429438, 1050.783288979),
        (969.130114856, 1004.844429438, 1050.783288979),
    ]]
    fillet(fillet_8_edges, radius=FILLET_8_R)

    # 草图14 → 切除-拉伸15 (cut)
    with BuildSketch(Plane.XY.offset(1055.083288979)):
        with Locations((983.201494917, 1013.231818313)):
            Rectangle(SKETCH_14_W, SKETCH_14_H)
    extrude(amount=-CUT_EXTRUDE_15_DEPTH, mode=Mode.SUBTRACT)


solid = part.part
